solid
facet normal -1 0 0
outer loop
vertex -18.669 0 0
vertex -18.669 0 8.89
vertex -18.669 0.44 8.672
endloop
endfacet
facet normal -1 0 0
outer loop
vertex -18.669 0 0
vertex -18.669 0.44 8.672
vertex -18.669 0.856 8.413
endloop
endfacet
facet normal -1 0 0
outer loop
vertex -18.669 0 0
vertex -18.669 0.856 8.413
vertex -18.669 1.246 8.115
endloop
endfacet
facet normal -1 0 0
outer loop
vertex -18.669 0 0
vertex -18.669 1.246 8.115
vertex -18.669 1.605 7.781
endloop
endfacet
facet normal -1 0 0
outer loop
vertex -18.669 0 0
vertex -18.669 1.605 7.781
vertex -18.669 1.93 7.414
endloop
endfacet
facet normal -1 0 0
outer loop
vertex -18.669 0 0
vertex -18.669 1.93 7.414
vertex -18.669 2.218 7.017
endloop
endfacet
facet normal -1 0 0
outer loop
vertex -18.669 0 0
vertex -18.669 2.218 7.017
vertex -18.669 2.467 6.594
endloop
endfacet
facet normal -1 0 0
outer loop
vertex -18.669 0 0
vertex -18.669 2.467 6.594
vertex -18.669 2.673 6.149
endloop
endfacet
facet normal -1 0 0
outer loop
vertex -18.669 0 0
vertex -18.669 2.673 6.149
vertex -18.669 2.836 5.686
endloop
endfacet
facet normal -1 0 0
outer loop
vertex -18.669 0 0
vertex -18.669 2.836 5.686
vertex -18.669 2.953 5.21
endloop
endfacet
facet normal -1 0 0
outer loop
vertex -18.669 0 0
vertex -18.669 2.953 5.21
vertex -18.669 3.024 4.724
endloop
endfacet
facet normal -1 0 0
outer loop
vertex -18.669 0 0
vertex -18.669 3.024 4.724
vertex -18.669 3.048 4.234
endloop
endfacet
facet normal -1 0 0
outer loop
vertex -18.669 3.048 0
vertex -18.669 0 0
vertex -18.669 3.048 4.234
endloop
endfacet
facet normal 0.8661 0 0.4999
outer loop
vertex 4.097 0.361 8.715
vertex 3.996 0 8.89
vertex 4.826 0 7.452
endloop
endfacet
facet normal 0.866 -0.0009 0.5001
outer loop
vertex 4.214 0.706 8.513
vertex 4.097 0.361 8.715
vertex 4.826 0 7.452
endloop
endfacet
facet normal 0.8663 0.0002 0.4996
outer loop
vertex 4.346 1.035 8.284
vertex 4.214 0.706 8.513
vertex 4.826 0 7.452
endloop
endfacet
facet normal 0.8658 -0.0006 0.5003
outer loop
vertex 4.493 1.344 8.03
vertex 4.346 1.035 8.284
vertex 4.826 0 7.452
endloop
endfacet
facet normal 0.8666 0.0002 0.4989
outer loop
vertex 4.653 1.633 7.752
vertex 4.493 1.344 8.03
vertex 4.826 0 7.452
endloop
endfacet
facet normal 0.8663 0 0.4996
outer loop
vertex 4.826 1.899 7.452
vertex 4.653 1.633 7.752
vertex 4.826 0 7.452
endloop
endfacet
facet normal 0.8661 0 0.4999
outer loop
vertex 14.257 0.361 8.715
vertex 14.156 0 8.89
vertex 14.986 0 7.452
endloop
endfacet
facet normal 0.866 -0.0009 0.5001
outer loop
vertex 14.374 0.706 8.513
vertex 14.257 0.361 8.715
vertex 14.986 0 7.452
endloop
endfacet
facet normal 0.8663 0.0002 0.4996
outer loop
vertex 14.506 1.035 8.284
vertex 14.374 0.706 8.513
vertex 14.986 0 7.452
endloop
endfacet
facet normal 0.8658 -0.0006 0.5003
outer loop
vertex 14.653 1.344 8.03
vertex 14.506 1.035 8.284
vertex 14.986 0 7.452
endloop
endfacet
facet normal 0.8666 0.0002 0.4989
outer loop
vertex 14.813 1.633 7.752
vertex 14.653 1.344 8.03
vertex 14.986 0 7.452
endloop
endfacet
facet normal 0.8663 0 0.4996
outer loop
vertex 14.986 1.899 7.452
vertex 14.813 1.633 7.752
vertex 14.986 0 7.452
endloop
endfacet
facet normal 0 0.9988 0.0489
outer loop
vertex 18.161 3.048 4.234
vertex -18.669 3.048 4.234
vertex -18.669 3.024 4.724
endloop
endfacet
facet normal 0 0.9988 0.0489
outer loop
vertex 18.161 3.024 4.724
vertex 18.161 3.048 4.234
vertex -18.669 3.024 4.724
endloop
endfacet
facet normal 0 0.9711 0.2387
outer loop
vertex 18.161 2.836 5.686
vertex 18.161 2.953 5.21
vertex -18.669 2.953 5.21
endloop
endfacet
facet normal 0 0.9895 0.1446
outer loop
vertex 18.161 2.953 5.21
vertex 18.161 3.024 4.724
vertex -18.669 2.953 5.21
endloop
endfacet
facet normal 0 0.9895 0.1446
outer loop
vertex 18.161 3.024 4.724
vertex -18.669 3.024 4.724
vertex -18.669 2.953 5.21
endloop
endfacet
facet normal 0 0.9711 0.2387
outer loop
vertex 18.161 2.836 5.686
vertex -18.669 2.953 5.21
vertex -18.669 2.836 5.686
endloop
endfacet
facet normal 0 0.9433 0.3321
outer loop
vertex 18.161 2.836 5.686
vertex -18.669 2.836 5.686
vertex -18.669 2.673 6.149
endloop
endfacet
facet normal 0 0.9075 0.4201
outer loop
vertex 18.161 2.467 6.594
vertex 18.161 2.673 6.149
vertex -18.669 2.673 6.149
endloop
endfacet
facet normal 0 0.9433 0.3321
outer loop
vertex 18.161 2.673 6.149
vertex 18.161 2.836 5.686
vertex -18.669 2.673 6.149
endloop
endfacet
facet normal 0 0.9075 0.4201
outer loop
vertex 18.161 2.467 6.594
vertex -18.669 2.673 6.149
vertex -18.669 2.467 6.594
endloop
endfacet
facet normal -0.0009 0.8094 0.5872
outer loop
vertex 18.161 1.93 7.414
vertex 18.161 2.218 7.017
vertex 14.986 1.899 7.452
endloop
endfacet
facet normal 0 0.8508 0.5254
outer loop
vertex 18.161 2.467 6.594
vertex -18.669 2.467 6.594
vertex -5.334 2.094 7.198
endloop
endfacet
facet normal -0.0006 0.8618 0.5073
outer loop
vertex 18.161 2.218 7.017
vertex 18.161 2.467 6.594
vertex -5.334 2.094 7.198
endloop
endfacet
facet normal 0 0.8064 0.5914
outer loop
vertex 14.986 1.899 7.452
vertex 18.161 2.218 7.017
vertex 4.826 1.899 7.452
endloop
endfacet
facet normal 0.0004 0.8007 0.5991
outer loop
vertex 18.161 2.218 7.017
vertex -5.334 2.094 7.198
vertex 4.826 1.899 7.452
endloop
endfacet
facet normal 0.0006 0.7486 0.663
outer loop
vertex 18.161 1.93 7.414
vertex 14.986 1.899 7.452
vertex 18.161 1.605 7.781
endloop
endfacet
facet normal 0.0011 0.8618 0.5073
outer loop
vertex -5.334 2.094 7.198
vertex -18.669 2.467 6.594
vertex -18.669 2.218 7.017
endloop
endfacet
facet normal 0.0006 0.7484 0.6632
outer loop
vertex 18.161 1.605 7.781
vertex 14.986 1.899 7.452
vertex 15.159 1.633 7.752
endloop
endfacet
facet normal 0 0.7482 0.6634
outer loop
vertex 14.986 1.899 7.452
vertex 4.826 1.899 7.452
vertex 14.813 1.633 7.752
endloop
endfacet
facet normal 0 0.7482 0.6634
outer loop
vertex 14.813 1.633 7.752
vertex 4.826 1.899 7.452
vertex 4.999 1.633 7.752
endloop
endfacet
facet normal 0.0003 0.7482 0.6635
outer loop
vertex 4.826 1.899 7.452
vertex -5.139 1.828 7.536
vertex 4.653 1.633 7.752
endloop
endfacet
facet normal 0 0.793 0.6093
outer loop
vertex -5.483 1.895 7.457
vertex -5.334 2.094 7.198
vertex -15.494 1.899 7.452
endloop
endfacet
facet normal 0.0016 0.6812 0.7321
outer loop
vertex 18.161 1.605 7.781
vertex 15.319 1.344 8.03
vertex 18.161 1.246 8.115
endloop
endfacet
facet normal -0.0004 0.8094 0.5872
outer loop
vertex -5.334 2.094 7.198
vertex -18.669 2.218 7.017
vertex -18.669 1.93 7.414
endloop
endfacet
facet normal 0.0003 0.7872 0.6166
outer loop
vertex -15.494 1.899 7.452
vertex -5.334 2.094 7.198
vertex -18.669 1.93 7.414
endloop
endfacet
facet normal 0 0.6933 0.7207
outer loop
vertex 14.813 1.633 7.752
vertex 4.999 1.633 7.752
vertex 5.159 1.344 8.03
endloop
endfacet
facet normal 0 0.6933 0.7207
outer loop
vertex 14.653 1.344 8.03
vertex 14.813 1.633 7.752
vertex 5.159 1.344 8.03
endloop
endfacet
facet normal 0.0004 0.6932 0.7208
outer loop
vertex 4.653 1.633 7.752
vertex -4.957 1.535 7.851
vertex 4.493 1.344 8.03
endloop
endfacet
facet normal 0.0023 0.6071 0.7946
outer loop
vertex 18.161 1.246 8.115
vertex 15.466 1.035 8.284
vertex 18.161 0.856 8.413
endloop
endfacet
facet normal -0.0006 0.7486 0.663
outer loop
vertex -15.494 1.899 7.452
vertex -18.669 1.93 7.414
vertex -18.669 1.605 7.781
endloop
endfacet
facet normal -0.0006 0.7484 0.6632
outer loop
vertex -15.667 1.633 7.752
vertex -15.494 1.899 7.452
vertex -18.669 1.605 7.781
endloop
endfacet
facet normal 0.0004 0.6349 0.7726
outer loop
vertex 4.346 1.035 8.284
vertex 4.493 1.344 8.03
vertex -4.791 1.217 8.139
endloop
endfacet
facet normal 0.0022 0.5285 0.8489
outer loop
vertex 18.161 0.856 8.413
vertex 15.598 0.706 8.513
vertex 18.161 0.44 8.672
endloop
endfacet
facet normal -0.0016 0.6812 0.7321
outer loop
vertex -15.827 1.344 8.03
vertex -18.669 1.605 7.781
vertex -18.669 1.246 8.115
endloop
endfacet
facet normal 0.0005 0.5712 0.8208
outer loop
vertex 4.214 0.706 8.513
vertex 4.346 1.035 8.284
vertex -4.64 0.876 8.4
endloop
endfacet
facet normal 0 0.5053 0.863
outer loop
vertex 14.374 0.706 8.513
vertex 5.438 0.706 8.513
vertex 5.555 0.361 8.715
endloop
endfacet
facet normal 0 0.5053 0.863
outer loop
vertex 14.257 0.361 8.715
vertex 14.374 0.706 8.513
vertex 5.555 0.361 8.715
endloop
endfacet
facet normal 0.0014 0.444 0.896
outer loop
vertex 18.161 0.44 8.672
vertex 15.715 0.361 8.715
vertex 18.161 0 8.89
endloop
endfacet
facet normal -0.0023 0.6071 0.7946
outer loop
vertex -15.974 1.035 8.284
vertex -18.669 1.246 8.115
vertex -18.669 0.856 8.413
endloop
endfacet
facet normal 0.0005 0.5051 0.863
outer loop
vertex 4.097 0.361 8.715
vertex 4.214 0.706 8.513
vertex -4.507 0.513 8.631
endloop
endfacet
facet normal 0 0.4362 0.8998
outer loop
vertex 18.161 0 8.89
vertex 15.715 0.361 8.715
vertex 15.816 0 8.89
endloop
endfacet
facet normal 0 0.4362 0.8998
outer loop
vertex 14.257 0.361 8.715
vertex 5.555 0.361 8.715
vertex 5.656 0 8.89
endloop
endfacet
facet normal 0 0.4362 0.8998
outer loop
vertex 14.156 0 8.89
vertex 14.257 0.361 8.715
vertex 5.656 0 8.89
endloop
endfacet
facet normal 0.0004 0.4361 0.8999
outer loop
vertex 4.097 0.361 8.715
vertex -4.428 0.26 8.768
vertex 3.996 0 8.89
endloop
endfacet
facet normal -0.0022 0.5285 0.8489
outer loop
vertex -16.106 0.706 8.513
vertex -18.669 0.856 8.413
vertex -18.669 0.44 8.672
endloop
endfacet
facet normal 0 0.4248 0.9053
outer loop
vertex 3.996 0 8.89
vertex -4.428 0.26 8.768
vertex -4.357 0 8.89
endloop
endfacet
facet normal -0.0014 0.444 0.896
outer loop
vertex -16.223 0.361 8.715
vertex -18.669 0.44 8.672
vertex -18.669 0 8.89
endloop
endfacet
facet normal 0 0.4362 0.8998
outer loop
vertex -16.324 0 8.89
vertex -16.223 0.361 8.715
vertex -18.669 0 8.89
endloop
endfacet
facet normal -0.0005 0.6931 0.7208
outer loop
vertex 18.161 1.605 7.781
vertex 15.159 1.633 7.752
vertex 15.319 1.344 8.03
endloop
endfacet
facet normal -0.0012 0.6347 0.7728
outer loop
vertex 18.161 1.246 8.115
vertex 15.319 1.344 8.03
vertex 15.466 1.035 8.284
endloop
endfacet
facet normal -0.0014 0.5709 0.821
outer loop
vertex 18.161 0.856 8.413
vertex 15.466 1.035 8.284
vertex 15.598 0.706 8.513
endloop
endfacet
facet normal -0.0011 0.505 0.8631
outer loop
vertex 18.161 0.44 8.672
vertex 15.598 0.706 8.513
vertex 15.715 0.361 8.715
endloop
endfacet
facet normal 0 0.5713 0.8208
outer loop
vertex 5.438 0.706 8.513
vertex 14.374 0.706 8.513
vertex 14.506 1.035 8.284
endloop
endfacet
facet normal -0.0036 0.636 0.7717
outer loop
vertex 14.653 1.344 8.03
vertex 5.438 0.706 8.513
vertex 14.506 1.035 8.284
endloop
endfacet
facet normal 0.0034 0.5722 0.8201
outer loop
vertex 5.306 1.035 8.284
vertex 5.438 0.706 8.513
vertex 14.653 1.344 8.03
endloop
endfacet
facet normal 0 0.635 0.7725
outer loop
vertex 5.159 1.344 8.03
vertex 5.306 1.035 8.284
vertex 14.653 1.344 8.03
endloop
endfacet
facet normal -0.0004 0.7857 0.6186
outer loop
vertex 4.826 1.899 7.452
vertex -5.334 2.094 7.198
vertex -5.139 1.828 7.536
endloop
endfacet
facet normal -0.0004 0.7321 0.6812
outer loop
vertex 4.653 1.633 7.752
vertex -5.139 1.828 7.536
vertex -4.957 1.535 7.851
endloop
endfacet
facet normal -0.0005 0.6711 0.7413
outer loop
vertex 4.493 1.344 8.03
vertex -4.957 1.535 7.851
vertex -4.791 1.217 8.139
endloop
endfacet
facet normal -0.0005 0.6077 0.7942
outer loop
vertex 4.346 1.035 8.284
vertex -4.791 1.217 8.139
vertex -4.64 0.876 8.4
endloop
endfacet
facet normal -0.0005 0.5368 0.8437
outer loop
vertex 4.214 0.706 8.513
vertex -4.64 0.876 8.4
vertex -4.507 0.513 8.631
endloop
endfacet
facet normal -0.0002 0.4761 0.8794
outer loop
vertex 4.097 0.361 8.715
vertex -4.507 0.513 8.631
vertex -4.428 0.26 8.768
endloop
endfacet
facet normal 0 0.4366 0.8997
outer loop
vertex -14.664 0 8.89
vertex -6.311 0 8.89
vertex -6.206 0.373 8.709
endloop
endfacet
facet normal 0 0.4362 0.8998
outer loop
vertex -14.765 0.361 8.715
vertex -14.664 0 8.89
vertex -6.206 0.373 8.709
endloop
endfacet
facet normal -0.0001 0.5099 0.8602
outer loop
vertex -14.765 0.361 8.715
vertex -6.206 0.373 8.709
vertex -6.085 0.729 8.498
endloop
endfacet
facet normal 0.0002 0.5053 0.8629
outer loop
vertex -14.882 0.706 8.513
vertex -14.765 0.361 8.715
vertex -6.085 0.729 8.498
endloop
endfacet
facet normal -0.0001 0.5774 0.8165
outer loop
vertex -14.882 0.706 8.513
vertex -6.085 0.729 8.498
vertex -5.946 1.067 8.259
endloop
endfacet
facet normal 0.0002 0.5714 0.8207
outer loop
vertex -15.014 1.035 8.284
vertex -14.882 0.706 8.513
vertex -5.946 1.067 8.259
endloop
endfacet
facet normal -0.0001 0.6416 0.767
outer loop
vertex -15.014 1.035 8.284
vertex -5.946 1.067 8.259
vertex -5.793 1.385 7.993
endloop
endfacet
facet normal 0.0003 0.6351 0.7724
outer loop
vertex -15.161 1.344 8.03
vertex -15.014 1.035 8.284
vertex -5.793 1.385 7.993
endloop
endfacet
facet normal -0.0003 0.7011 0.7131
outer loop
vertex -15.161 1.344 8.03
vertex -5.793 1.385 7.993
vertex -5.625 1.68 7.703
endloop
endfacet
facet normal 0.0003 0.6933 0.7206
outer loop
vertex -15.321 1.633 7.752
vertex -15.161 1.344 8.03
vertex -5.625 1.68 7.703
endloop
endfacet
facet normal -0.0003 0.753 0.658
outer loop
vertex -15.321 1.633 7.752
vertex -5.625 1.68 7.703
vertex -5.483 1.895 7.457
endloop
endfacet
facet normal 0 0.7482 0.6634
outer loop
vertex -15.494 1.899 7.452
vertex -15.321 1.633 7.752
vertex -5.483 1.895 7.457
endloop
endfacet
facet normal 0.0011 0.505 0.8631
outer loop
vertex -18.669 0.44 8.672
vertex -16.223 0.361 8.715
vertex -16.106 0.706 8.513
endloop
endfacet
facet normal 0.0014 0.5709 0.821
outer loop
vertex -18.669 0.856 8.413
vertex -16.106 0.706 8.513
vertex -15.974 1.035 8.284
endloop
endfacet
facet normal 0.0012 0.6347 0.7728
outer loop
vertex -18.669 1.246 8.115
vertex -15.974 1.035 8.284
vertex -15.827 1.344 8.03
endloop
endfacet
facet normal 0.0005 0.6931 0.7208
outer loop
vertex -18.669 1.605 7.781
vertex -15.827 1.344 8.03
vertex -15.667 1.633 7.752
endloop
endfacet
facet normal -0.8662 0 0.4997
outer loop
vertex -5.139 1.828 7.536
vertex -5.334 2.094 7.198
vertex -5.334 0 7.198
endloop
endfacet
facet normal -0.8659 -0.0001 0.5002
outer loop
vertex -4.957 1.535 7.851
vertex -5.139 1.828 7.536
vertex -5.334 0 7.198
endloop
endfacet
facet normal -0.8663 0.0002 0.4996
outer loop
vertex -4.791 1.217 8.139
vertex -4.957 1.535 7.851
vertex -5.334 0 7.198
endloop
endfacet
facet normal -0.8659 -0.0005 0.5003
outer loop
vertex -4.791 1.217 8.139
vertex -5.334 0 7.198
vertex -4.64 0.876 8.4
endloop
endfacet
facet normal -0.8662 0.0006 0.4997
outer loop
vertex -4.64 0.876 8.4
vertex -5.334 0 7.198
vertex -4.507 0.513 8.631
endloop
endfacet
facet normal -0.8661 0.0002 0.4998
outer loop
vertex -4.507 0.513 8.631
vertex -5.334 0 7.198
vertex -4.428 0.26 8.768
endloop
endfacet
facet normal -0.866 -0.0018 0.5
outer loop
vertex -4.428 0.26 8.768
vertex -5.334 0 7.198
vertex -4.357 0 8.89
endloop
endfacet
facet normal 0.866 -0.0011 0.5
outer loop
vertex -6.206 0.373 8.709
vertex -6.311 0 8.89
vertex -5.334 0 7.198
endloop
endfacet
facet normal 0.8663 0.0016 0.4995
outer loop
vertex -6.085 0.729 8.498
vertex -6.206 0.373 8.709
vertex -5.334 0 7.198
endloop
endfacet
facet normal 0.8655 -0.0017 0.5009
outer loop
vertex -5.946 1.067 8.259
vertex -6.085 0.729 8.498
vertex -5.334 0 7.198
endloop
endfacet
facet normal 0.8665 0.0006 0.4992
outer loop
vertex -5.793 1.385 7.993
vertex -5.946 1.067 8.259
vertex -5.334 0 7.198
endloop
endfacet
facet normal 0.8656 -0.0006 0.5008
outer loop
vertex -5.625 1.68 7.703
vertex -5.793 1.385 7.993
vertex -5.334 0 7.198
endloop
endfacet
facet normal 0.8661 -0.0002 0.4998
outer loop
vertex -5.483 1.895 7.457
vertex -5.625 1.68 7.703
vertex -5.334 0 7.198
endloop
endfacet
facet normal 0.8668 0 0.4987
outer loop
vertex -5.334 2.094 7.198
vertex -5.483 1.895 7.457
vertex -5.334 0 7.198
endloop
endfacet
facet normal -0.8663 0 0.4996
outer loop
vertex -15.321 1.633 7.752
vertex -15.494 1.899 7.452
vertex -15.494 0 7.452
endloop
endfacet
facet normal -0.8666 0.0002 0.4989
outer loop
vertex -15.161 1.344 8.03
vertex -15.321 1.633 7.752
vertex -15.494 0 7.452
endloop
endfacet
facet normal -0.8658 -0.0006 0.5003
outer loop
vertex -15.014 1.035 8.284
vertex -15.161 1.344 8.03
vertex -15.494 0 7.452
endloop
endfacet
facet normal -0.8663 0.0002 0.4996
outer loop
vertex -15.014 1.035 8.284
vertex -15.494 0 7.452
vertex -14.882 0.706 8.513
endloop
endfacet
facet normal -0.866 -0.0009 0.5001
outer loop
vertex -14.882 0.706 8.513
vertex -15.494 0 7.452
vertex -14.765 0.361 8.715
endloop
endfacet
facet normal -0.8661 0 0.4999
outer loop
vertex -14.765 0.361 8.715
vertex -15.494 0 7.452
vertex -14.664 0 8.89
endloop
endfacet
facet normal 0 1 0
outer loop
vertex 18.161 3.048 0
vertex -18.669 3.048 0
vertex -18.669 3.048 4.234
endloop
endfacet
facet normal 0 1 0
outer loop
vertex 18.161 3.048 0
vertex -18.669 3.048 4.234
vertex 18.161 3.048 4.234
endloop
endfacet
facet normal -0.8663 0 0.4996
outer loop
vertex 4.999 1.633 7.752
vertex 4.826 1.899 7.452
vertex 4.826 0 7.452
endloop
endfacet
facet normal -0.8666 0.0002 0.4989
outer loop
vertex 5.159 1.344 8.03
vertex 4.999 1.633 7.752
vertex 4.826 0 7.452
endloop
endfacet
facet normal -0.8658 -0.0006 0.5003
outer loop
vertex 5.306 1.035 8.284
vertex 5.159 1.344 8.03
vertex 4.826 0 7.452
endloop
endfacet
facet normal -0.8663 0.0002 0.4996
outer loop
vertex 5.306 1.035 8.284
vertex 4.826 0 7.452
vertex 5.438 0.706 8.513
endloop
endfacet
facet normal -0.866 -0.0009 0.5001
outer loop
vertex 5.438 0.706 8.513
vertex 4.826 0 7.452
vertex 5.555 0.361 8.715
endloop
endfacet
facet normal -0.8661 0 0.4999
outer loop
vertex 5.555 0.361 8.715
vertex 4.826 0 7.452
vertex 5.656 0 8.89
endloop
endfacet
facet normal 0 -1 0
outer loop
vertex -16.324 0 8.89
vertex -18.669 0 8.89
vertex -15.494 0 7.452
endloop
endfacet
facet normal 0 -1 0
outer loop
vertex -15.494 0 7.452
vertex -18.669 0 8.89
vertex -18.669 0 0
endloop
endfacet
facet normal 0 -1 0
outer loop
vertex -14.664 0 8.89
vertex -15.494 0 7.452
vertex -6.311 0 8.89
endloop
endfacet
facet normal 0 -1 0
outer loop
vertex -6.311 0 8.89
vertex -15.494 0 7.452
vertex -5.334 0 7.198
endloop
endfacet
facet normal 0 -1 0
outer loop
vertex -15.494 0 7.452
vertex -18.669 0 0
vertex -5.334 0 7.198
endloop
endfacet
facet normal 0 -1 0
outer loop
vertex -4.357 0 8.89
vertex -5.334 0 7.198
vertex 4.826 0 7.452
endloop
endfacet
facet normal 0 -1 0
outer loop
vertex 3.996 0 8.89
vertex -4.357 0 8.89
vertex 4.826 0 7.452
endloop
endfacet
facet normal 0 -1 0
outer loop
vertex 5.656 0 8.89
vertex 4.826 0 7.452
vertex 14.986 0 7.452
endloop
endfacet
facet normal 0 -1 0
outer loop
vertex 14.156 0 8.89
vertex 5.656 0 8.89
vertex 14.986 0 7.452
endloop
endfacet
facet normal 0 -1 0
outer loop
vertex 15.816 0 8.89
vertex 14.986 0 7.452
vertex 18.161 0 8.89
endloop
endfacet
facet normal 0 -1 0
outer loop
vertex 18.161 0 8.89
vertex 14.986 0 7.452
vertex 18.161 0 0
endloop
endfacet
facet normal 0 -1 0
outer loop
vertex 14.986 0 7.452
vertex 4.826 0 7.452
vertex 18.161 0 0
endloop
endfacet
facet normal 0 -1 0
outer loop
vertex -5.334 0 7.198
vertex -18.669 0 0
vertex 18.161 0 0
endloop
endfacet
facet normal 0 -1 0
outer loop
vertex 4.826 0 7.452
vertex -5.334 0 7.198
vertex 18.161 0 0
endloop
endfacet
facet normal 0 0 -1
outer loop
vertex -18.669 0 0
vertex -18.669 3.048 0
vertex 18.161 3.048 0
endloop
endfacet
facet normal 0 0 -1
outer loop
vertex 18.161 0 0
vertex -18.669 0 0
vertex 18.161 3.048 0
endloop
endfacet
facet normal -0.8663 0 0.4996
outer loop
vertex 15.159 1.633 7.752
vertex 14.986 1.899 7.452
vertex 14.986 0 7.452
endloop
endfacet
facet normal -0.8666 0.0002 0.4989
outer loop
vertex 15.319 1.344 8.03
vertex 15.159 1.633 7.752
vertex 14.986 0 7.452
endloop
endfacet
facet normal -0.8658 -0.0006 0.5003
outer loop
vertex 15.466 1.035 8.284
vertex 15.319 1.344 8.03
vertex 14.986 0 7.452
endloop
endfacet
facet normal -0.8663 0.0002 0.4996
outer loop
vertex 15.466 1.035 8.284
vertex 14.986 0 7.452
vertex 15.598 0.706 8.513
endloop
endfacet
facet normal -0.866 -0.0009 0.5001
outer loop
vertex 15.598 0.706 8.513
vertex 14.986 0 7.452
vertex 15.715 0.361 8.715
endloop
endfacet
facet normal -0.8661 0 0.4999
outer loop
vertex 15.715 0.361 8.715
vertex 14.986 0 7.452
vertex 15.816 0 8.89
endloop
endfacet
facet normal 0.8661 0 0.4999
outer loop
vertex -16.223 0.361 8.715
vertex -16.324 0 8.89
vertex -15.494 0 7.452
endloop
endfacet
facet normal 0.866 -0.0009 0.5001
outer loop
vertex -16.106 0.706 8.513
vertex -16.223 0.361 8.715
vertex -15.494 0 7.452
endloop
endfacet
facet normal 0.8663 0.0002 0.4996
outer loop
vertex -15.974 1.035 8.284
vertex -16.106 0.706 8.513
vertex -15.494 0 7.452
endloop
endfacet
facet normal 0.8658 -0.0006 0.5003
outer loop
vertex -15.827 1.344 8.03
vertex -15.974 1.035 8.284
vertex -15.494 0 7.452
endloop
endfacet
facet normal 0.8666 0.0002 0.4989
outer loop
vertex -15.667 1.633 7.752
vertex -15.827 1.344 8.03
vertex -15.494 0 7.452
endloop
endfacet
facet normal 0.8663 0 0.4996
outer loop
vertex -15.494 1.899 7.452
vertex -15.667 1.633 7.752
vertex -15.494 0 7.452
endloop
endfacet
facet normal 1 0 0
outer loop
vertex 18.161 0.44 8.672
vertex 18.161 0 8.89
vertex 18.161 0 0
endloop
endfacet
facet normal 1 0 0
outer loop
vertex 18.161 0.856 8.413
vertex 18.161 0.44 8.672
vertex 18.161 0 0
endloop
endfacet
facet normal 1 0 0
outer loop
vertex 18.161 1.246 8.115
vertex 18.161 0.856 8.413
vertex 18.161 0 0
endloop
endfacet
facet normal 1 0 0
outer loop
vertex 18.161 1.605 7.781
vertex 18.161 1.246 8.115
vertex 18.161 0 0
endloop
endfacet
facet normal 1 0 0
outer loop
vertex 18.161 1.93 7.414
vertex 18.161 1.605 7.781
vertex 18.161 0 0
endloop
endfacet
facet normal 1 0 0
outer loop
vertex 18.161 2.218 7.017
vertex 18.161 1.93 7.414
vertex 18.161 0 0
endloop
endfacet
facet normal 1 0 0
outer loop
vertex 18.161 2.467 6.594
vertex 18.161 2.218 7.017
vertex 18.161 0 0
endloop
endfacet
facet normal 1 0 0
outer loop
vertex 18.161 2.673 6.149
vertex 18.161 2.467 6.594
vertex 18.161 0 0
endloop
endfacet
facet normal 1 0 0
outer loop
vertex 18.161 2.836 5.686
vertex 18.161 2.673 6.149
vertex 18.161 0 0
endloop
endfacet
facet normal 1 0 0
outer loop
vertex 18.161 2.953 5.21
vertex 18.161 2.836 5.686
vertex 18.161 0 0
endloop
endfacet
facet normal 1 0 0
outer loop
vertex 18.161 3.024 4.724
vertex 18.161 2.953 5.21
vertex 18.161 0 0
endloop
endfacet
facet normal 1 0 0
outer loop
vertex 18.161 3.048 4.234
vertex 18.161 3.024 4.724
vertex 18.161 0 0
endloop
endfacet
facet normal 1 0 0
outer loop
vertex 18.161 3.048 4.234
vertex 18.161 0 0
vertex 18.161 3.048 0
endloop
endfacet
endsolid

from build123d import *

# Parameters (mm, degrees)
F0_W        = 36.83
F0_H        = 3.048
F1_DEPTH    = 8.89
F3_T1_DEPTH = 60.1094845304
F4_DEPTH    = 25.4


# Not quite as in the source:
# - a fillet or chamfer that OpenCascade refuses, or shapes differently, is made with other operations: its cross-section is extruded or revolved along the edge and cut away or added


with BuildPart() as f1:
    # F0 (on Top) → F1 (new body)
    with BuildSketch(Plane.XY):
        with Locations((-0.254, 1.524)):
            Rectangle(F0_W, F0_H)
    extrude(amount=F1_DEPTH)

    # F3: fillet of radius 5.08 on 1 edges, made by hand

    # F3_s2 → F3_t1 (cut)
    with BuildSketch(Plane.YZ.offset(-30.3087422652)):
        with BuildLine():
            ThreePointArc((3.048, 4.2341030939), (2.2182329348, 7.0165336861), (0, 8.89))
            Line((0, 8.89), (3.048, 8.89))
            Line((3.048, 8.89), (3.048, 4.2341030939))
        make_face()
    extrude(amount=F3_T1_DEPTH, mode=Mode.SUBTRACT)

    # F2 (on face) → F4 (cut)
    with BuildSketch(Plane.XZ):
        Polygon((-15.494, 7.4522954744), (-14.6639409051, 8.89), (-16.3240590949, 8.89), align=None)
        Polygon((-4.3572939367, 8.89), (-6.3107060633, 8.89), (-5.334, 7.1982954744), align=None)
        Polygon((5.6560590949, 8.89), (3.9959409051, 8.89), (4.826, 7.4522954744), align=None)
        Polygon((15.8160590949, 8.89), (14.1559409051, 8.89), (14.986, 7.4522954744), align=None)
    extrude(amount=-F4_DEPTH, mode=Mode.SUBTRACT)


solid = f1.part
